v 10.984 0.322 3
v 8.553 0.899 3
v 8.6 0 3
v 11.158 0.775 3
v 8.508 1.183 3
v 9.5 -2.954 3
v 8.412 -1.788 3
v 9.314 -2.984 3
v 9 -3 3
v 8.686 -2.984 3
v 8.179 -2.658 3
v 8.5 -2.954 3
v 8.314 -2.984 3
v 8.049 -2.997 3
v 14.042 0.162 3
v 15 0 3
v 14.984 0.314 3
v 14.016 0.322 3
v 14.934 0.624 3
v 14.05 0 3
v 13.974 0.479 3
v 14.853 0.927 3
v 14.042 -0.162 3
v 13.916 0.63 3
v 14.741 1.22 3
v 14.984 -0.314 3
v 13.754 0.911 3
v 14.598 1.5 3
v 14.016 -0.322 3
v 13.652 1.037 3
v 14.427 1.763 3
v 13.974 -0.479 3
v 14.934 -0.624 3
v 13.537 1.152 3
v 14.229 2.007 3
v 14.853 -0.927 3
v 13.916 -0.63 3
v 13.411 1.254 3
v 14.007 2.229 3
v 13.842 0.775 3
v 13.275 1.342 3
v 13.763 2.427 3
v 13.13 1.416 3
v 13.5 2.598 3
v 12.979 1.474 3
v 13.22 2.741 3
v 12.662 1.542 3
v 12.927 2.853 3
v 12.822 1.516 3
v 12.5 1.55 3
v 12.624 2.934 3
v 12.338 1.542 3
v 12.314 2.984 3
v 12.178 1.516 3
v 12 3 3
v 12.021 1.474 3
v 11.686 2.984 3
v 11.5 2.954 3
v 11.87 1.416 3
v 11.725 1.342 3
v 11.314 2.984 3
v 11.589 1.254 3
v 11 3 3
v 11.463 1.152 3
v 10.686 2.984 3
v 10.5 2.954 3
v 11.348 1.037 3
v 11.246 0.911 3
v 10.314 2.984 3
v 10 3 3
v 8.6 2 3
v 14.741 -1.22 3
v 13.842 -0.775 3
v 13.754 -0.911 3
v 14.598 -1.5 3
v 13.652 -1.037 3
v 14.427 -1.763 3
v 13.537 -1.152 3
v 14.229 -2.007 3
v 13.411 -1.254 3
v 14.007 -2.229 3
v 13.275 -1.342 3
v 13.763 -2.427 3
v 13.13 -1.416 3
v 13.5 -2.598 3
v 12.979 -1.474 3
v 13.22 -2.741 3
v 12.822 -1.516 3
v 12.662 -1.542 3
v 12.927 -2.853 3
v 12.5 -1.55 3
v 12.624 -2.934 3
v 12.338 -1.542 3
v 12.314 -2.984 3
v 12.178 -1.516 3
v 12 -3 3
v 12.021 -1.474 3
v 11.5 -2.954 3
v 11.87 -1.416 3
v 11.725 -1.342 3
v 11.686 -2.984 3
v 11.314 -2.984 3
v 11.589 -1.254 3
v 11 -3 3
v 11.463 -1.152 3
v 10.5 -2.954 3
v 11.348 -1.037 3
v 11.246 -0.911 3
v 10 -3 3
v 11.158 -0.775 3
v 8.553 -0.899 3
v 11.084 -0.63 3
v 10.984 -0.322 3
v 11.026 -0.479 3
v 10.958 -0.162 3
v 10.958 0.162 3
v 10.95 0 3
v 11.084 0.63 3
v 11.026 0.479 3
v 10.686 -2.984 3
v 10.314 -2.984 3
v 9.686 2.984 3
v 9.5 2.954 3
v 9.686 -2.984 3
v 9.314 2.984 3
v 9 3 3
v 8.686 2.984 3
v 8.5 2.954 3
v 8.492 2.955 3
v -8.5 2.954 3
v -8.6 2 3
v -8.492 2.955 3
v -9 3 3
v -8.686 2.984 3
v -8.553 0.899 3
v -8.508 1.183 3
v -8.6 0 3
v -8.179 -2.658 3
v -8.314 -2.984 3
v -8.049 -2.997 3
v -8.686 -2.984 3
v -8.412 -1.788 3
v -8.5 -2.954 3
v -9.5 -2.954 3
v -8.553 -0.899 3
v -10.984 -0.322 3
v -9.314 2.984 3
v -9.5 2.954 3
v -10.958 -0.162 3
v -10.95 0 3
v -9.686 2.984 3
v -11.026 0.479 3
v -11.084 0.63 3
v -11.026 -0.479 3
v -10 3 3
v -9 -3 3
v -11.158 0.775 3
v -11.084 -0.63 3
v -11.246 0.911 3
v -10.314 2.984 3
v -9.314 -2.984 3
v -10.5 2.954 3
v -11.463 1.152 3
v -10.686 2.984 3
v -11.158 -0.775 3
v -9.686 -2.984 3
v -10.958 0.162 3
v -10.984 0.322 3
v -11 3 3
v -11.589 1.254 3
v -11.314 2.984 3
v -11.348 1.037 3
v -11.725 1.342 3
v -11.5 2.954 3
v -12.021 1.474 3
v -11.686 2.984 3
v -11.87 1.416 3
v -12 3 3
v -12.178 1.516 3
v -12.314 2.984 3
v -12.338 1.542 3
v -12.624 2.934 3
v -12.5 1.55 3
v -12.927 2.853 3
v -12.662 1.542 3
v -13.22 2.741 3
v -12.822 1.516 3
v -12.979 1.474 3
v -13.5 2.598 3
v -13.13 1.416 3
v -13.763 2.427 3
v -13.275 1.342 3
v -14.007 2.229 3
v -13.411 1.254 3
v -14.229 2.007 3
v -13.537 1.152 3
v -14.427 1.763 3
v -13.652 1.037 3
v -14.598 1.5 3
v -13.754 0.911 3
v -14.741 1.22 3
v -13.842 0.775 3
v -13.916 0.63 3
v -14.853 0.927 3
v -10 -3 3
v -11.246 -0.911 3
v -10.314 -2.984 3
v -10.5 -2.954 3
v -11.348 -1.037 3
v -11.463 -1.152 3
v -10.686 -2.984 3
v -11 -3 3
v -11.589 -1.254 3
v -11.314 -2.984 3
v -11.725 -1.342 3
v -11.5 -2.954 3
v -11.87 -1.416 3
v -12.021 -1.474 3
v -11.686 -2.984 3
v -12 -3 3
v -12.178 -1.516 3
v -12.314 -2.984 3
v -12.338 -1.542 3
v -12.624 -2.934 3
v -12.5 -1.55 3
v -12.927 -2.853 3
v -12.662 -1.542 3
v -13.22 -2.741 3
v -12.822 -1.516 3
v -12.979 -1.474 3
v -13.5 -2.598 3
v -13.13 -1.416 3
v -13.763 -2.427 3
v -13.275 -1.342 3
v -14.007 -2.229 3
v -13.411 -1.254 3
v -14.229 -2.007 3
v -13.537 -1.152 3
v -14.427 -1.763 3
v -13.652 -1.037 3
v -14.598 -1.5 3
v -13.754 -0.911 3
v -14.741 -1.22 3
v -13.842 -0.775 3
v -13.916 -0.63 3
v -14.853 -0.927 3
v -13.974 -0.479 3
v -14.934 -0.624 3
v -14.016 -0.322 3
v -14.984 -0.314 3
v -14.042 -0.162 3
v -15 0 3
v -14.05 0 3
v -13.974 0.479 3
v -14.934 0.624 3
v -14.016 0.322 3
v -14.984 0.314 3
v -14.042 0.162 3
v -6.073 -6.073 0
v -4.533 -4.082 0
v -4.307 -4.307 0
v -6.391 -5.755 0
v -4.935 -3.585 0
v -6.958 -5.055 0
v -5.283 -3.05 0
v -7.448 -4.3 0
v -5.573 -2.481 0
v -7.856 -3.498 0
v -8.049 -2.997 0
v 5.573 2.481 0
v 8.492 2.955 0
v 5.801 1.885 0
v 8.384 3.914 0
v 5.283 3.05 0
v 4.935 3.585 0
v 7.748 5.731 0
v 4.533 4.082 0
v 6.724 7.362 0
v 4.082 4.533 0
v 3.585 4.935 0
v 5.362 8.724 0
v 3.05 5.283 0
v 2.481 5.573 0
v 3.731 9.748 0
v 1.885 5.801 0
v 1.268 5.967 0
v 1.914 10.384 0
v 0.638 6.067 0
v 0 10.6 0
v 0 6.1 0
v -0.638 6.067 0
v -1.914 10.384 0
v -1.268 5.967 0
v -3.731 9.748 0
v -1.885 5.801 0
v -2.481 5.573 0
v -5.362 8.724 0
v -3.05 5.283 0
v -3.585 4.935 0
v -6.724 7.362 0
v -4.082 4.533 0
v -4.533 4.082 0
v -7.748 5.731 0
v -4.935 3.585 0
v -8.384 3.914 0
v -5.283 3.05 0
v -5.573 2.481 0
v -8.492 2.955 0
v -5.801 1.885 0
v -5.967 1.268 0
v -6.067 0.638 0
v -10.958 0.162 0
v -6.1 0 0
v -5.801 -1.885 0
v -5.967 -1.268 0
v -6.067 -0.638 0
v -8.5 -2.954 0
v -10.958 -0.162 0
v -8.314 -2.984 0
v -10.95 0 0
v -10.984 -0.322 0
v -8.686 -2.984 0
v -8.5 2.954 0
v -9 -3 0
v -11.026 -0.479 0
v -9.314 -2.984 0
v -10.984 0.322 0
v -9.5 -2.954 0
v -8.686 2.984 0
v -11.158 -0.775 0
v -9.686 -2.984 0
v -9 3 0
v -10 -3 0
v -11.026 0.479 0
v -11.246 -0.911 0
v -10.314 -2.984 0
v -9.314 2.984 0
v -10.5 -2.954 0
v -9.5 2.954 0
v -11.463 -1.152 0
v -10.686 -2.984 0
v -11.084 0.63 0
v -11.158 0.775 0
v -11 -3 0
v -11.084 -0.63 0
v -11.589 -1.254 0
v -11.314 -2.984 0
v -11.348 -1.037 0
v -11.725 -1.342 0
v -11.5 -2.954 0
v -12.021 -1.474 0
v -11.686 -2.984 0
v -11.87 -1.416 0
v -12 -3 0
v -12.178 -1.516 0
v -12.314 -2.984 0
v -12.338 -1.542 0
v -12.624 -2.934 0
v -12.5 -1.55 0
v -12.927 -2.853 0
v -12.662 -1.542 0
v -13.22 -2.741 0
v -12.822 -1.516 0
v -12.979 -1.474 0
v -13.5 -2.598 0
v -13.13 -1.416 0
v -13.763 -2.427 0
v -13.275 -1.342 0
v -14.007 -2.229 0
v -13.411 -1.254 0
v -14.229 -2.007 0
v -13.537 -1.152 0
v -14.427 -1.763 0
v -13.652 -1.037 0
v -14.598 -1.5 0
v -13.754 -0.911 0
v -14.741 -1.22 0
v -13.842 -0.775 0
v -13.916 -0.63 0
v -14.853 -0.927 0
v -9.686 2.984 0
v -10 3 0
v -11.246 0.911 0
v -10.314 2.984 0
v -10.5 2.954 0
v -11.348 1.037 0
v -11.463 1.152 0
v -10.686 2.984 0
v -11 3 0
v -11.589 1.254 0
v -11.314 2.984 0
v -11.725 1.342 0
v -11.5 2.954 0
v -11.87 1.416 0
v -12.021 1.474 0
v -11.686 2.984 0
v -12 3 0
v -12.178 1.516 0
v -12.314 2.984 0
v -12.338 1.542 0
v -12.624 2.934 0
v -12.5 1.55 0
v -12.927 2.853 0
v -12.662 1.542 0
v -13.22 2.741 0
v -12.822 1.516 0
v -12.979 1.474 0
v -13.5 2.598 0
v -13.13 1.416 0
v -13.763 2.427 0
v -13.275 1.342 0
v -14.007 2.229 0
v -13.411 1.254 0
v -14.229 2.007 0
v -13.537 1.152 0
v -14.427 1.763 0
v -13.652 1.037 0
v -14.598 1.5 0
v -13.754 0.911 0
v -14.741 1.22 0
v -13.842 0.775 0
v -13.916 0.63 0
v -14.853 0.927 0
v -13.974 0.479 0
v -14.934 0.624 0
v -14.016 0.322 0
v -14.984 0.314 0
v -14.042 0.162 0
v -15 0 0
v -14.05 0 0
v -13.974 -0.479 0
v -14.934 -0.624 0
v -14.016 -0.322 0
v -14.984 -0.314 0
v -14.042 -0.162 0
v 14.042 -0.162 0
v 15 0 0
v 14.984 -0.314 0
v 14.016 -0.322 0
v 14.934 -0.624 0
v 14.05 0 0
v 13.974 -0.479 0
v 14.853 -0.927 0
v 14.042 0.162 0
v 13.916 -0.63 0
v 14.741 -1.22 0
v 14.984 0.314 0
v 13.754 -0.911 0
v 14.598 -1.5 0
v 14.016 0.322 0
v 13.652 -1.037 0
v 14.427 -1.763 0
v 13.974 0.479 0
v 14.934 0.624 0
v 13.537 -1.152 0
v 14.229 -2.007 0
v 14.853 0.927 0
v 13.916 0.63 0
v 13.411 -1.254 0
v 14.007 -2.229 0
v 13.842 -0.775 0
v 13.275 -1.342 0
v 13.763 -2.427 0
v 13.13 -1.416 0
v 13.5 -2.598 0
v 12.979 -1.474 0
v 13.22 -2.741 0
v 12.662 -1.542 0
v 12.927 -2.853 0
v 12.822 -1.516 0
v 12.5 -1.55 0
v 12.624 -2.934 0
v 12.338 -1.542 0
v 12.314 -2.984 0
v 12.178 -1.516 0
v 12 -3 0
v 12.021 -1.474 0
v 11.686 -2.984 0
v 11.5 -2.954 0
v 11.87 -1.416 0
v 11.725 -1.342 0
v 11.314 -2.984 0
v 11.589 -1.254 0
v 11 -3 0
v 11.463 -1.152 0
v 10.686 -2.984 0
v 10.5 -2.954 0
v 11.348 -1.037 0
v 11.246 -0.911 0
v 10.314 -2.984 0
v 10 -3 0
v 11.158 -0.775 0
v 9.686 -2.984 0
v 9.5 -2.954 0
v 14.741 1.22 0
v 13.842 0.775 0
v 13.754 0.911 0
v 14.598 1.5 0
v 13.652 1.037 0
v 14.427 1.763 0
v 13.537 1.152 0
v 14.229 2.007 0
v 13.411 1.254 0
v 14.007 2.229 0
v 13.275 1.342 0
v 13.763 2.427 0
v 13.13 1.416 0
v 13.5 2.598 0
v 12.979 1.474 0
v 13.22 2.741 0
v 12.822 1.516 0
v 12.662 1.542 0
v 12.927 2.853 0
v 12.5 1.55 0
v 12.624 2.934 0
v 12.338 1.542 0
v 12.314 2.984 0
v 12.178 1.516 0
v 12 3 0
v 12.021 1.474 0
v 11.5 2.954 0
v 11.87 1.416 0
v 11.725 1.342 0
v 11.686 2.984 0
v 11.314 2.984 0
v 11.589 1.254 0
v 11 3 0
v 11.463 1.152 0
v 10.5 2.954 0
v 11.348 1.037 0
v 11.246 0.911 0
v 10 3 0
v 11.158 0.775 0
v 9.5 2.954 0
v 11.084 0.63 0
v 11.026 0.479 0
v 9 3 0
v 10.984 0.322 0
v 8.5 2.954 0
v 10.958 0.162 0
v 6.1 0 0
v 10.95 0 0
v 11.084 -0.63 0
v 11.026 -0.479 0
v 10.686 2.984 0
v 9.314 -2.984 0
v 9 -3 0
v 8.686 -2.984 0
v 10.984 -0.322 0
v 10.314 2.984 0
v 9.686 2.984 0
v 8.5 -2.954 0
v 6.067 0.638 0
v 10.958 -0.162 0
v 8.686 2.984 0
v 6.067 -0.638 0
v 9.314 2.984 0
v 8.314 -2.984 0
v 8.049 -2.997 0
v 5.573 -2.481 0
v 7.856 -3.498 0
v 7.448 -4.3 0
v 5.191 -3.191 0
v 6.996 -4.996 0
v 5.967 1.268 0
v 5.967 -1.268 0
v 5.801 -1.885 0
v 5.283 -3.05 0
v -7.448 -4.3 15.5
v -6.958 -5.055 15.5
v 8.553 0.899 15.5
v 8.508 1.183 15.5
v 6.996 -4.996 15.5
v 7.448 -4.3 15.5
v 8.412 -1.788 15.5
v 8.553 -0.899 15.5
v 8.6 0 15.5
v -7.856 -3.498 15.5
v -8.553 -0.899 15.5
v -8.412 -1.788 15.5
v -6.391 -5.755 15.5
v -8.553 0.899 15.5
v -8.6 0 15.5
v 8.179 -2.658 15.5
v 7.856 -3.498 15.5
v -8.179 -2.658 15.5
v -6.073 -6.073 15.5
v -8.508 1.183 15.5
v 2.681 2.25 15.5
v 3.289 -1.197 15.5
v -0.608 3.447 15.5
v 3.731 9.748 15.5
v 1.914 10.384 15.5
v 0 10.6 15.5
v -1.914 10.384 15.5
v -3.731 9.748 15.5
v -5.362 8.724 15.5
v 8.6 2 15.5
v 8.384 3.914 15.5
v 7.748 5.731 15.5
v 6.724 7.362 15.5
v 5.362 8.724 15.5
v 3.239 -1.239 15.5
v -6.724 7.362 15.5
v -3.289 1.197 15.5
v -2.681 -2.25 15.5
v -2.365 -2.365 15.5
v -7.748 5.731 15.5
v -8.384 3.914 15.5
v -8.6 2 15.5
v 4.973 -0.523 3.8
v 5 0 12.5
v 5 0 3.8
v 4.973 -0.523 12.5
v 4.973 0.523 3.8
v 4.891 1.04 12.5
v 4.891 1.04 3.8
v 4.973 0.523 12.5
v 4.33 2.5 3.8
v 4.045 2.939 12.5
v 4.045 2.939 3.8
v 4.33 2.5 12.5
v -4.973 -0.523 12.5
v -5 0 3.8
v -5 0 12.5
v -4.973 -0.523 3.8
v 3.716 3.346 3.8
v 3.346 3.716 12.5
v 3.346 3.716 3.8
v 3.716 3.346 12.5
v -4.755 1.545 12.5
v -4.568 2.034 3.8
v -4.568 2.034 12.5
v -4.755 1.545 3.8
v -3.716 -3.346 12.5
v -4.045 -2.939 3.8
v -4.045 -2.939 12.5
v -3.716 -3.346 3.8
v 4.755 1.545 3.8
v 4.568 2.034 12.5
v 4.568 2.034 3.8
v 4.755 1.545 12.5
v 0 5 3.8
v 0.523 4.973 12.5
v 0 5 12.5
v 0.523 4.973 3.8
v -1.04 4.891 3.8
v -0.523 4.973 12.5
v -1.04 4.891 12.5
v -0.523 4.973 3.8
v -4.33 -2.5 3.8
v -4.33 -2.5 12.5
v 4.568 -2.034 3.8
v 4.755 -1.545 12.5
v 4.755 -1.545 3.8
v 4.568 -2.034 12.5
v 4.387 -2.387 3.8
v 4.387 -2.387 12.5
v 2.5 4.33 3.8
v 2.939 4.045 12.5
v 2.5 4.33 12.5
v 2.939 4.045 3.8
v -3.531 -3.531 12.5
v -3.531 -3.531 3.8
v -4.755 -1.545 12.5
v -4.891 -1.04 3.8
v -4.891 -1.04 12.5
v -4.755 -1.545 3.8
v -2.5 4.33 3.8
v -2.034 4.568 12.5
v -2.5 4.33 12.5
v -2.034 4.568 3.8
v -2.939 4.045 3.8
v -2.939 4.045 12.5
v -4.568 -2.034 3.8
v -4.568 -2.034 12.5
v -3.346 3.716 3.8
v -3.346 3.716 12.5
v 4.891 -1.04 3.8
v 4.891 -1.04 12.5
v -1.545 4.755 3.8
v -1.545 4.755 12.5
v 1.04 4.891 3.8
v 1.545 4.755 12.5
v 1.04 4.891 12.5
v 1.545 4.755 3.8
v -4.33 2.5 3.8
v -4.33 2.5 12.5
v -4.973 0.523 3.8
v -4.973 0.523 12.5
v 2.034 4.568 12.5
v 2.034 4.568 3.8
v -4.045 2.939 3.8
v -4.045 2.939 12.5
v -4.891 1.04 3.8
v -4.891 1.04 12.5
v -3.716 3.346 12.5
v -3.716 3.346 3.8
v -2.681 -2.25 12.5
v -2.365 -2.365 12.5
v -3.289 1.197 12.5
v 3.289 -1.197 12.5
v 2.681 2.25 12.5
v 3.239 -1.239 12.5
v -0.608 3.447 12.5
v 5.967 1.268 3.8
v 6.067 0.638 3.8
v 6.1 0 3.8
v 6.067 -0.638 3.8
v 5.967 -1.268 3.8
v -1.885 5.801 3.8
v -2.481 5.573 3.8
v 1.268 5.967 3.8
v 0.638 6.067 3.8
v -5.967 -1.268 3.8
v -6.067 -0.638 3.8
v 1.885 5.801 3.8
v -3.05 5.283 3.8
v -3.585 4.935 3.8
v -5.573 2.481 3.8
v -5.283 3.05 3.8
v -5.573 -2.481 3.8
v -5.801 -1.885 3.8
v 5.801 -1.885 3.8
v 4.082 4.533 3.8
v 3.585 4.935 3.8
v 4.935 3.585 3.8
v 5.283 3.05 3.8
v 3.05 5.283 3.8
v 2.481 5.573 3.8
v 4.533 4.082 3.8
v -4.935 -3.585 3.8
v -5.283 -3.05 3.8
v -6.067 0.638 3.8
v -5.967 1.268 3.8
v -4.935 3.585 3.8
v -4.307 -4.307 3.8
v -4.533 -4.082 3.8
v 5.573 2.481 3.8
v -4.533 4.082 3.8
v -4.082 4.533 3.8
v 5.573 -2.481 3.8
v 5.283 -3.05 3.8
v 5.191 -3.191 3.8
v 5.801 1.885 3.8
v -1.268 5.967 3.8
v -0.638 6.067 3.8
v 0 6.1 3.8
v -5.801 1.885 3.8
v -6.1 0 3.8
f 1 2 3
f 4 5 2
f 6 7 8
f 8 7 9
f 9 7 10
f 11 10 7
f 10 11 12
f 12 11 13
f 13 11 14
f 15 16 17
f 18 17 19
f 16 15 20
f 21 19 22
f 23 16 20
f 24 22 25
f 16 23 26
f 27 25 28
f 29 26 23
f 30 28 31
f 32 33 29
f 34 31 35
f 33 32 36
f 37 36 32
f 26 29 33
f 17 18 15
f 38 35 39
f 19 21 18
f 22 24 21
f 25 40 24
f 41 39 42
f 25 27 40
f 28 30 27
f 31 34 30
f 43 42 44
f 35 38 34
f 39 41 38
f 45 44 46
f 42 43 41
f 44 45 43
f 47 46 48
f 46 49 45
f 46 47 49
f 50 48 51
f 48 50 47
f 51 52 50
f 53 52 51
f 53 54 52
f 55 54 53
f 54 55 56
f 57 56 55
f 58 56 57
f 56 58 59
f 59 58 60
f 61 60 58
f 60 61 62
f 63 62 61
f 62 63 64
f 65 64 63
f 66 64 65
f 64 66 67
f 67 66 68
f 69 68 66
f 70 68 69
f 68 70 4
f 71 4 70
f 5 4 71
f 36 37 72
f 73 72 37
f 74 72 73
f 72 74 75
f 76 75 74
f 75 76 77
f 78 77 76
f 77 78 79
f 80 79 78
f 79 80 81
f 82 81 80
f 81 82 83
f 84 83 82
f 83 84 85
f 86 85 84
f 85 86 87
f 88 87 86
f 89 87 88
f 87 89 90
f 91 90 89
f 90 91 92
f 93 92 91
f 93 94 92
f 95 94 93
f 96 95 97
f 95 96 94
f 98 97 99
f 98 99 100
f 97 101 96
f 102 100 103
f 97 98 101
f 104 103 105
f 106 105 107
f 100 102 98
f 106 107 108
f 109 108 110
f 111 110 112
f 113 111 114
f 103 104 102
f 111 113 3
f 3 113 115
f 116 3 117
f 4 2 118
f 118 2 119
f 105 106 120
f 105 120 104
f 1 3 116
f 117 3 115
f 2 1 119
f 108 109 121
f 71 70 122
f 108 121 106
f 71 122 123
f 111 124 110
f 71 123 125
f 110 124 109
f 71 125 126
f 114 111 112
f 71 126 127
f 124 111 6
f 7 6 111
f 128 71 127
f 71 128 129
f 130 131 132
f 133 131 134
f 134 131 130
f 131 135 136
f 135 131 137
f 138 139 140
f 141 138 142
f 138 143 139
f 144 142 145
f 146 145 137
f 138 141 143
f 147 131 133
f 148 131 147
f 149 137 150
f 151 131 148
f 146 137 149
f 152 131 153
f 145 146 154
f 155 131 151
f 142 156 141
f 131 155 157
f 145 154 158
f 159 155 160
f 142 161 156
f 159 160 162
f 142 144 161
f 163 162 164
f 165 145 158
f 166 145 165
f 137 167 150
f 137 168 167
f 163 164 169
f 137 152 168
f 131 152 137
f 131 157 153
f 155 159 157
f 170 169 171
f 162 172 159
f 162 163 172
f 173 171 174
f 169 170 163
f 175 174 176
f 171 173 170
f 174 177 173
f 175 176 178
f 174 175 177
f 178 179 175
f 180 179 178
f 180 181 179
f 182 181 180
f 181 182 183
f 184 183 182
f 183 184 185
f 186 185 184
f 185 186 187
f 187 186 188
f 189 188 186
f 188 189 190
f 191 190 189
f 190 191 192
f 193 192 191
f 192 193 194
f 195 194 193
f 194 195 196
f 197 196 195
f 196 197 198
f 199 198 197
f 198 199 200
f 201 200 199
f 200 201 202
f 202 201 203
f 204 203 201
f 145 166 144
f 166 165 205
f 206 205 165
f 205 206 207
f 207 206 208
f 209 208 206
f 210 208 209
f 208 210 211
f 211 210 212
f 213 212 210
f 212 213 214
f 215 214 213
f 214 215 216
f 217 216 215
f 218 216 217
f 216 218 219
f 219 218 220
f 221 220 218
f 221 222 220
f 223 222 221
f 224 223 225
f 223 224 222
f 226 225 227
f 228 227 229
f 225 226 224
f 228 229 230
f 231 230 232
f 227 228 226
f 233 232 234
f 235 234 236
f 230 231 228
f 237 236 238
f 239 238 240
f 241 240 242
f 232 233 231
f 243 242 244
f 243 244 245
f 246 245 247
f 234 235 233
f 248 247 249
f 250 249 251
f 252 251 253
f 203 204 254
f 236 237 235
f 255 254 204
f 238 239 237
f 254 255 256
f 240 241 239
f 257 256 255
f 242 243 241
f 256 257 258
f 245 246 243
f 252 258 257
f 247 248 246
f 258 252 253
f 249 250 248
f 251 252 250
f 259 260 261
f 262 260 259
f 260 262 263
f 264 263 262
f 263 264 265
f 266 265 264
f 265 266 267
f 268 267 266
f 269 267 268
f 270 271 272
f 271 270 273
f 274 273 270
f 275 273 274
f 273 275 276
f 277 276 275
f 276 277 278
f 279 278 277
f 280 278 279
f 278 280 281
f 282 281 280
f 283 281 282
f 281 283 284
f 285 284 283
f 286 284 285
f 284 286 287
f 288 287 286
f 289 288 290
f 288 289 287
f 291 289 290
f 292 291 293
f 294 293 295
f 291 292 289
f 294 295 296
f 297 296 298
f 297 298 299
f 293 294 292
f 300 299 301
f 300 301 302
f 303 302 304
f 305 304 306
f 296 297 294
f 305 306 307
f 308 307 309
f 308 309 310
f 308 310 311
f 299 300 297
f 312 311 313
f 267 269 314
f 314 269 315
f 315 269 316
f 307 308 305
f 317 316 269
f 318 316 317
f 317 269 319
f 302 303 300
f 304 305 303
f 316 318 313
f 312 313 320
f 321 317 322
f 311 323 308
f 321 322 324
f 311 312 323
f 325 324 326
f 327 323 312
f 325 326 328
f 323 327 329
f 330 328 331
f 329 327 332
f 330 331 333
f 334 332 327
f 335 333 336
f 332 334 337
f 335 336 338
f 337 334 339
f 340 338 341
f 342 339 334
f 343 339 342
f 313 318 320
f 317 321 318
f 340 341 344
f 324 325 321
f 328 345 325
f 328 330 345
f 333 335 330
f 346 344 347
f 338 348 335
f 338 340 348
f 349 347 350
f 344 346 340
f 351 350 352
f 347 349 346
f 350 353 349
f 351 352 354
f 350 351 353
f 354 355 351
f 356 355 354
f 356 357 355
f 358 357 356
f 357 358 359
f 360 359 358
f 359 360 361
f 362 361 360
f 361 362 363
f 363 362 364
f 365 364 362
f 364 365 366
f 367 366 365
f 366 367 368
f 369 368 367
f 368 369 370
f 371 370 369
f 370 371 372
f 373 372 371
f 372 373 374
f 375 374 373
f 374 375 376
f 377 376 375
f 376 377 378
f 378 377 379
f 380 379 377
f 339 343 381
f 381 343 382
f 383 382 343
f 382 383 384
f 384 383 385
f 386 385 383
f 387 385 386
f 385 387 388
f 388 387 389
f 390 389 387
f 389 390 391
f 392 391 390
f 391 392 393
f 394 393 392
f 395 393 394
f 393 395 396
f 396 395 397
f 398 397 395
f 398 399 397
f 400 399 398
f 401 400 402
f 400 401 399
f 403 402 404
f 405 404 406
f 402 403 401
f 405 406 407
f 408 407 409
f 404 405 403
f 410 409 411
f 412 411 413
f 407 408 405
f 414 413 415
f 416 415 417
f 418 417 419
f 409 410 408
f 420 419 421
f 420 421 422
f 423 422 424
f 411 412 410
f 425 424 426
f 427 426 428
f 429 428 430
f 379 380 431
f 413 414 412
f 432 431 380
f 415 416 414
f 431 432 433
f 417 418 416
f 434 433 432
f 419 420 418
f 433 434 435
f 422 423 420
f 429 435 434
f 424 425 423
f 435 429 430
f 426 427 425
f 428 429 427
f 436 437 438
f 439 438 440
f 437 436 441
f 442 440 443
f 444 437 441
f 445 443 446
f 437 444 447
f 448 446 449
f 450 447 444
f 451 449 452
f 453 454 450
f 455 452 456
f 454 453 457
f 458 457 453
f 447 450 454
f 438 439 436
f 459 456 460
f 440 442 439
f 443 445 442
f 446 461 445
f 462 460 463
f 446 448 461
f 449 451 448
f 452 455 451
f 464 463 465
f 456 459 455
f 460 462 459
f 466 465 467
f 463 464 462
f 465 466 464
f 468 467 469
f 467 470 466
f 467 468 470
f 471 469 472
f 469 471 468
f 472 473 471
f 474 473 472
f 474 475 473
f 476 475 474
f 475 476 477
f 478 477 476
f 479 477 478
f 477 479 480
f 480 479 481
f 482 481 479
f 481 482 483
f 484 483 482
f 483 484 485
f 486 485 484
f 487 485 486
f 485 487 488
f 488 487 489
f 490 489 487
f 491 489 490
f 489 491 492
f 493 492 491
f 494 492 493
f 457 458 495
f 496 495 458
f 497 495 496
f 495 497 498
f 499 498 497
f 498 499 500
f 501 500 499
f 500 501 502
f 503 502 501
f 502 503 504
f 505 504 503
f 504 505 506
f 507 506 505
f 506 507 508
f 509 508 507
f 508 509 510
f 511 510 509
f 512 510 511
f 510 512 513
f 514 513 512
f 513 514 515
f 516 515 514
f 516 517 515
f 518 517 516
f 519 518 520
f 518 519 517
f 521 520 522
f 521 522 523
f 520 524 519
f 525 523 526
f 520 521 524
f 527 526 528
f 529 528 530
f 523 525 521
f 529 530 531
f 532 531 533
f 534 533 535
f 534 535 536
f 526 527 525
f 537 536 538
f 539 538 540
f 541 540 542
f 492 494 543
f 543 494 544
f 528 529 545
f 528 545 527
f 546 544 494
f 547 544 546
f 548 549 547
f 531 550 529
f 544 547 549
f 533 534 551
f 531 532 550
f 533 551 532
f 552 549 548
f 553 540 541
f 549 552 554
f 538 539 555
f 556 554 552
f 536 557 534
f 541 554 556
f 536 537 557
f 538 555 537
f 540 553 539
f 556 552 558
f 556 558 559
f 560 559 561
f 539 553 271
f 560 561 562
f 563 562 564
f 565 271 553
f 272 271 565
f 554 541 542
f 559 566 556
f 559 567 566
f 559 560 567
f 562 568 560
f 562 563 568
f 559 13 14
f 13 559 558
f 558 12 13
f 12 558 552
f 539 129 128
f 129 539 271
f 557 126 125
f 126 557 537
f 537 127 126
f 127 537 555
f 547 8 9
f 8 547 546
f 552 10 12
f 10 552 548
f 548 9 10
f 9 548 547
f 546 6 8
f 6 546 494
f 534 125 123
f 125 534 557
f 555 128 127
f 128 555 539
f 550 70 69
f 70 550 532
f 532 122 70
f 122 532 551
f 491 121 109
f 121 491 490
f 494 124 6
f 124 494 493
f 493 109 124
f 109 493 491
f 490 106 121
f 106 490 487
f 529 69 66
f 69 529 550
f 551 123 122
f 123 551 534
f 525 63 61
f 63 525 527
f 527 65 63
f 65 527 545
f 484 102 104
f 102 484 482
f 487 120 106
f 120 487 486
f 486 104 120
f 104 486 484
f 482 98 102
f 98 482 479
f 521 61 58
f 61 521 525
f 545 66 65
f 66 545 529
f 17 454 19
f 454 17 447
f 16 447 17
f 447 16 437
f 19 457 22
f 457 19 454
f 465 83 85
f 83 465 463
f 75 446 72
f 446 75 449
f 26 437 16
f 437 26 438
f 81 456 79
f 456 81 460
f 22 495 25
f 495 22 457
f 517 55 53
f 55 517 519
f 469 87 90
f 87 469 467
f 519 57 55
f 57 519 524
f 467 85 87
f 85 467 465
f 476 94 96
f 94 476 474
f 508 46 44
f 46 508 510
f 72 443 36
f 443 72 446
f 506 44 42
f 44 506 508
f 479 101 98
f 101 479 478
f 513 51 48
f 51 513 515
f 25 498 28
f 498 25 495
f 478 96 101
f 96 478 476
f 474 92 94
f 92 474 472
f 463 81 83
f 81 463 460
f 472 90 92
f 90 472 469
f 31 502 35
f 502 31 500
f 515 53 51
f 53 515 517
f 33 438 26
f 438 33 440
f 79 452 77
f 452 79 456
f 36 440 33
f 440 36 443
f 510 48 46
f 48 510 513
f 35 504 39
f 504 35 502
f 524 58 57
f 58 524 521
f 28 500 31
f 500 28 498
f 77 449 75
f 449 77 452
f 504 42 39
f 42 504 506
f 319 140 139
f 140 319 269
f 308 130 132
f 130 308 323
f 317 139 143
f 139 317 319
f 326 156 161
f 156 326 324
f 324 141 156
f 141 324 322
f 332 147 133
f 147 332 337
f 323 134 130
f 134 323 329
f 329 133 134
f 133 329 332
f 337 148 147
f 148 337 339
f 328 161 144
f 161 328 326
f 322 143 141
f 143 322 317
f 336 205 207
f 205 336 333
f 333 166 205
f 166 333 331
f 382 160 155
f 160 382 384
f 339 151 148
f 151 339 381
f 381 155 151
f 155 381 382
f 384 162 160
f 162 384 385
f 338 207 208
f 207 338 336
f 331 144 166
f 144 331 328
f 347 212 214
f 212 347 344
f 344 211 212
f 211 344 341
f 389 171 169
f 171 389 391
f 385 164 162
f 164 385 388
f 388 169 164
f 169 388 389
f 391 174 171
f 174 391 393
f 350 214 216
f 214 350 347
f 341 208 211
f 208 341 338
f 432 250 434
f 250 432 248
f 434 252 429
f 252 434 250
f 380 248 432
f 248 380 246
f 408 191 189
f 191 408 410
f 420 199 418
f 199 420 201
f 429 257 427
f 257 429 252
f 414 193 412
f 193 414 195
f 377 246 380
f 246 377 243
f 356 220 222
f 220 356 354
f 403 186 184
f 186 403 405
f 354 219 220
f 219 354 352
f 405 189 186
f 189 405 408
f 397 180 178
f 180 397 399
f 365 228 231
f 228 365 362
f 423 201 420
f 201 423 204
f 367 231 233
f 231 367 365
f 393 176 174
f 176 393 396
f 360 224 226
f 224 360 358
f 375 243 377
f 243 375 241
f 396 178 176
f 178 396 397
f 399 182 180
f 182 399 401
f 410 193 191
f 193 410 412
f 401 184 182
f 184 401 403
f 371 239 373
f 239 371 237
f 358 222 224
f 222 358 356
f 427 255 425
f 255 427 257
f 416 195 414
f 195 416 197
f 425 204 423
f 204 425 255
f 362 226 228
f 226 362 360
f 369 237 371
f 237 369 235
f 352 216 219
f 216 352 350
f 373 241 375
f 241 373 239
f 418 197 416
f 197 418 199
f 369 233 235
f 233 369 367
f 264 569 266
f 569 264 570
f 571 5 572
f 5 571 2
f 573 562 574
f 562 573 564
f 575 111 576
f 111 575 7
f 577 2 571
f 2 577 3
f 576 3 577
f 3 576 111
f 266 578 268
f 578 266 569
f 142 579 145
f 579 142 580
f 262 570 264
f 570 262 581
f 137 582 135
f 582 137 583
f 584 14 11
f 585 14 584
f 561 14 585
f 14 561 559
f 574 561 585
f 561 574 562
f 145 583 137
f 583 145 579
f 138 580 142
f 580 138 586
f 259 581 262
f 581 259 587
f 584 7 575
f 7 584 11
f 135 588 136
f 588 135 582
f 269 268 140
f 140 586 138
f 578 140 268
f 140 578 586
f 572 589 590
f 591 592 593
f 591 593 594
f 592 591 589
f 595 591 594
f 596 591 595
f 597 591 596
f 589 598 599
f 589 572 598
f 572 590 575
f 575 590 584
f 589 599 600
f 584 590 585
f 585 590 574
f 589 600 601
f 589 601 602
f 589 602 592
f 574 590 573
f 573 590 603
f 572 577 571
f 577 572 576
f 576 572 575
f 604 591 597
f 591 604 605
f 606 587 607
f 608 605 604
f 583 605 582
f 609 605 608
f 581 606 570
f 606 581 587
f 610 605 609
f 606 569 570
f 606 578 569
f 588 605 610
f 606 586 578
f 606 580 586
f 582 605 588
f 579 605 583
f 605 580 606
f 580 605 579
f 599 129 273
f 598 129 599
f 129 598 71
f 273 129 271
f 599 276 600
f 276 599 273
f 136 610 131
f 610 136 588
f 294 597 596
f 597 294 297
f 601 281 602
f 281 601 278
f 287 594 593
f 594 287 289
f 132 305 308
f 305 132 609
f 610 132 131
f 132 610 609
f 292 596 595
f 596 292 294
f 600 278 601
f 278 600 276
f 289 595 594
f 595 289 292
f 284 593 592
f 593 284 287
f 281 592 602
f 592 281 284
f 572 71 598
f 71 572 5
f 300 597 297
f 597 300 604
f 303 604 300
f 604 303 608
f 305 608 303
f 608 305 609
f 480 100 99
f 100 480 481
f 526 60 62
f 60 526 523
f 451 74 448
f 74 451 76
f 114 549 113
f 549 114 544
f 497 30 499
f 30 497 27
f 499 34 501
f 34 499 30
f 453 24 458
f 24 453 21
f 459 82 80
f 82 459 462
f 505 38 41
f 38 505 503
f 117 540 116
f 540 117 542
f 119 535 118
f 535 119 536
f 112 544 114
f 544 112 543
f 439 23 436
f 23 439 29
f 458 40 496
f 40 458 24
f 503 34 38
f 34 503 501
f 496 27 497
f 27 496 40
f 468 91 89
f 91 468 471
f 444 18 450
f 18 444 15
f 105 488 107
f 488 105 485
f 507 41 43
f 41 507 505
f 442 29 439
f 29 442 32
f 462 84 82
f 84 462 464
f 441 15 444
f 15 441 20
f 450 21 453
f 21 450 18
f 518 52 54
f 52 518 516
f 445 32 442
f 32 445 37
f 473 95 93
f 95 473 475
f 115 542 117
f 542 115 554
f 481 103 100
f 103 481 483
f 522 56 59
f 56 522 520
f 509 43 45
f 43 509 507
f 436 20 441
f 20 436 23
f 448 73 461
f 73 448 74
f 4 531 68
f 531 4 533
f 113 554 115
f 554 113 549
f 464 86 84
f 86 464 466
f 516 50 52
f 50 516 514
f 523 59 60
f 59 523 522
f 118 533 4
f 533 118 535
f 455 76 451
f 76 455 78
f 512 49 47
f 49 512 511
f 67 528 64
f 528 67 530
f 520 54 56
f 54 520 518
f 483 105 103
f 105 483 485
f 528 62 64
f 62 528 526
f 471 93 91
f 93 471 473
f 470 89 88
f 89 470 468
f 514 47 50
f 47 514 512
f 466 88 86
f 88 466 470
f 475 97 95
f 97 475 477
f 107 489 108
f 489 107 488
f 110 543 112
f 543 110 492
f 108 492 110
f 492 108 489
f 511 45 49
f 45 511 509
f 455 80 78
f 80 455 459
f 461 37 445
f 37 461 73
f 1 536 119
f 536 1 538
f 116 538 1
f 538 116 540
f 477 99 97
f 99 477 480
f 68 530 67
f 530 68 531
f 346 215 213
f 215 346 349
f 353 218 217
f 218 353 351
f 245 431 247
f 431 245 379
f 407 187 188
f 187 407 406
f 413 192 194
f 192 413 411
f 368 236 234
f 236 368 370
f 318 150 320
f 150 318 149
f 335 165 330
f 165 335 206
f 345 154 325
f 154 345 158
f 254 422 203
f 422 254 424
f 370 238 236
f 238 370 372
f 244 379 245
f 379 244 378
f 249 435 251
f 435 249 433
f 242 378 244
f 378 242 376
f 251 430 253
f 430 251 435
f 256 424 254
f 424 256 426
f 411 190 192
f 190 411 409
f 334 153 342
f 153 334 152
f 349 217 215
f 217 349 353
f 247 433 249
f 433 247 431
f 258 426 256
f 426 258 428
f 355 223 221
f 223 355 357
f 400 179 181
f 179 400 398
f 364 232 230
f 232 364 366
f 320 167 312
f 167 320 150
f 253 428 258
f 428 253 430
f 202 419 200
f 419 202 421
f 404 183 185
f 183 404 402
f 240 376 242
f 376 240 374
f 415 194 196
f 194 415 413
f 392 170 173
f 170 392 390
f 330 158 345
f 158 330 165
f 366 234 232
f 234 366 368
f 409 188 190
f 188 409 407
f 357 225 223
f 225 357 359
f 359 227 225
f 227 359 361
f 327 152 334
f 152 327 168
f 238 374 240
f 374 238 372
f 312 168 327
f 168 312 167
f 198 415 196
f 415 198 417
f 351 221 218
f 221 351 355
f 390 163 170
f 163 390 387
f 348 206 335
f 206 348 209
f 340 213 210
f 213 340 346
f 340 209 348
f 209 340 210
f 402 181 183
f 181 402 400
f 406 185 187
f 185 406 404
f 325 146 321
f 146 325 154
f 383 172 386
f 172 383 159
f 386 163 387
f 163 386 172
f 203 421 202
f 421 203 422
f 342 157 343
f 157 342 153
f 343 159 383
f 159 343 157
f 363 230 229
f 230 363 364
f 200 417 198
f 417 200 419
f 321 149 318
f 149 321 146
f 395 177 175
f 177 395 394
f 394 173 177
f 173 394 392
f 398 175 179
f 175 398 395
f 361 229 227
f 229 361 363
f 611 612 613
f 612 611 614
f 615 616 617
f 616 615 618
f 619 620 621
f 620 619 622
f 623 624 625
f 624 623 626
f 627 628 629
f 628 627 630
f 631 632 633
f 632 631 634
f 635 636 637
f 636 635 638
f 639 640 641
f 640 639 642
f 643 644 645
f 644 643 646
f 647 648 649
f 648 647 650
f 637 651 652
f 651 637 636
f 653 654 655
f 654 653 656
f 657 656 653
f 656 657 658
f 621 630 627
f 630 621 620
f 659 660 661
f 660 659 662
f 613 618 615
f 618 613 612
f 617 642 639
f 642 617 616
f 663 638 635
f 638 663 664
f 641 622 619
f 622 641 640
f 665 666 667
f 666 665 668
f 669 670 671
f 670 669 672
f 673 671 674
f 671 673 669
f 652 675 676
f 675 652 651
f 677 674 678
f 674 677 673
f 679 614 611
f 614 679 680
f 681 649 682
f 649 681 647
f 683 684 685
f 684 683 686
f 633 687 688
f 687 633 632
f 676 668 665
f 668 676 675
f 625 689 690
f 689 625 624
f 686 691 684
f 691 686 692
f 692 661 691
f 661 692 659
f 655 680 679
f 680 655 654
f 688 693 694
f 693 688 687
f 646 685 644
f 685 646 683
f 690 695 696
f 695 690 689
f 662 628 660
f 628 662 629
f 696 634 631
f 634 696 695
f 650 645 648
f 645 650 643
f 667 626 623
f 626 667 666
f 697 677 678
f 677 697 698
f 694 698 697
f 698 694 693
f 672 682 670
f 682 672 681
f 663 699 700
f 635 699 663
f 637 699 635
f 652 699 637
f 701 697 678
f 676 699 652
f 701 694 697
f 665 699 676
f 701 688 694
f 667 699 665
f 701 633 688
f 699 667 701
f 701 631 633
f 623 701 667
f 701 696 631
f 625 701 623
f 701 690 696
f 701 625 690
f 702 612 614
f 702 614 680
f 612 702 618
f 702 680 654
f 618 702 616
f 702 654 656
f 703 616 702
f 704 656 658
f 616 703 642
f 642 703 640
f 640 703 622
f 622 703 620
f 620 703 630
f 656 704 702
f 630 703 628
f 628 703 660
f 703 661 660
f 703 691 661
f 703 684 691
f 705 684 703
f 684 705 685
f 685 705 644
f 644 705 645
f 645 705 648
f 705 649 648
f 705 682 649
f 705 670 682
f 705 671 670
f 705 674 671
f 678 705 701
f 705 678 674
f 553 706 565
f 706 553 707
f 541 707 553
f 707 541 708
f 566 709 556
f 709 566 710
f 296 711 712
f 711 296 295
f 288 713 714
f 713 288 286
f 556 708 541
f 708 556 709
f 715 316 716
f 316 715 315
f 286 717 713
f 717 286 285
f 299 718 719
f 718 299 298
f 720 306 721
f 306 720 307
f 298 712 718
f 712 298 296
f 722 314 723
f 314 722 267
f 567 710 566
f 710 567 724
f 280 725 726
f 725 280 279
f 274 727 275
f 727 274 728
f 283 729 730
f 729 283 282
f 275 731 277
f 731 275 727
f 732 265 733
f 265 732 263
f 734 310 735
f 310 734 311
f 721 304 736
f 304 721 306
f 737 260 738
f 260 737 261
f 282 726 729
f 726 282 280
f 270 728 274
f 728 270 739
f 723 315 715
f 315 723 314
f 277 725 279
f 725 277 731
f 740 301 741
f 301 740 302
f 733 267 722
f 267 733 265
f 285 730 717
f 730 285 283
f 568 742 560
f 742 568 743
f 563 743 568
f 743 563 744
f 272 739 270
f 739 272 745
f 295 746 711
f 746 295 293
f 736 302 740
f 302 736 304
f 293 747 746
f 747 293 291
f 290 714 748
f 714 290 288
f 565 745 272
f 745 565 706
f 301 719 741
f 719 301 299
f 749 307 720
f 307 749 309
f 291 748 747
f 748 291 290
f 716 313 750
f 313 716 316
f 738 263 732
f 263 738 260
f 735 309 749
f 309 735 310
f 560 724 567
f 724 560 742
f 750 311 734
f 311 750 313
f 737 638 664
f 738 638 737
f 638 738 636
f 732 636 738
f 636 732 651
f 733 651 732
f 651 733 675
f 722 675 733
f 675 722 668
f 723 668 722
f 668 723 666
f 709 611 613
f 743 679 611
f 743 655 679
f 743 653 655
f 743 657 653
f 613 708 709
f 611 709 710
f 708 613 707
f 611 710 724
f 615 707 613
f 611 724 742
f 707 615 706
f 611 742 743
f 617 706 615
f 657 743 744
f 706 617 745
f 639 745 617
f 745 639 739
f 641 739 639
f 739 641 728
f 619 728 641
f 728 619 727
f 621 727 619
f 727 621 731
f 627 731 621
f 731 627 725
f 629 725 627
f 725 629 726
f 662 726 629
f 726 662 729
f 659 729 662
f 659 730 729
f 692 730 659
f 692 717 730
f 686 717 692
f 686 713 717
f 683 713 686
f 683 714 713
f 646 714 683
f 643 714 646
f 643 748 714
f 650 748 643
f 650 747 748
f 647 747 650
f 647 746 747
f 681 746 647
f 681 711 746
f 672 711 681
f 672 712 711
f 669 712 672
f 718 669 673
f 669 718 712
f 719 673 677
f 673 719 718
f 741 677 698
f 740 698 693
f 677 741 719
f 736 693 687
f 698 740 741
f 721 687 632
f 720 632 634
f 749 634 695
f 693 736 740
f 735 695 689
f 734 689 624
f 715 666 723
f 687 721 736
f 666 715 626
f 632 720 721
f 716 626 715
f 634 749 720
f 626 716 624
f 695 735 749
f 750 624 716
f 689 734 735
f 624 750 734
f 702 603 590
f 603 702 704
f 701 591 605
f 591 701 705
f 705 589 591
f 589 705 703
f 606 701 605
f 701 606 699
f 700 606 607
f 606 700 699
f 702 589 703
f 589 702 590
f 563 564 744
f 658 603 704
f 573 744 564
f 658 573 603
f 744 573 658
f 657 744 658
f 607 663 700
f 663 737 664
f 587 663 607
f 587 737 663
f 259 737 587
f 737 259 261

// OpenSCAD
bottomdia=11.2;
bottomheight=10.8;
height=20.5;
effectorheight=8;
topdia=9.0;
wall=3;
pipedia=7;
mount_radius=12.5; // standard hole mounting = 25mm therefore 12.5

module nozzleholder() {
    difference(){
            union(){
    //base for effector nuts
            for (a=[-45,145]) rotate ([0,0,a])
                for (b=[0:mount_radius]) translate([b,0,0]) cylinder(r=wall+1,h=wall, $fn=60);
    //main body
            cylinder(r=(bottomdia/2)+wall, h=height+wall, $fn=60);
    //reinforcement
            translate ([2,1, 0]) cylinder(r=(bottomdia/2)+wall, h=height+wall, $fn=60);
                    }
    //hollow for holder
            translate ([0,0,-1])
                cylinder(r=(bottomdia/2+0.5), h=bottomheight+1, $fn=60);#
            translate ([0,0,bottomheight])
                cylinder(r=(topdia/2)+0.5, h=height-bottomheight, $fn=60);#
            //hole for mount screws
                    for (a=[-45,145]) rotate ([0,0,a])
                    translate([mount_radius,0,0]) cylinder(r=1.55, h=3*wall, $fn=60);
    //hole for pipe and holder
            rotate([0,0,40])cylinder(r=(pipedia/2),h=height+5, $fn=6);
    //cutaway - bottom
    //        translate([-40,-20,wall]) rotate([0,0,37])cube([30,35,bottomheight-wall]);
    //        translate([7,-22,wall]) rotate([0,0,37])cube([30,20,bottomheight-wall]);
    //cutaway - mid
    //        translate([-10,-5,bottomheight+wall]) rotate([0,0,37])cube([30,30,height-bottomheight-wall]);
    //        translate([7,-22,bottomheight+wall]) rotate([0,0,37])cube([30,20,height-bottomheight-wall]);
    //cutaway cheeseslice
            translate([1,1,-5]) linear_extrude(height = height+15) polygon(points=[[0,0],[-bottomdia*2,0],[0,-bottomdia*2]]);
            }
            }
            
//this module for use when some of the needleholder physically penetrates the effector. Adds variable effectorheight for region contained within effector, surprisingly enough     
module cutoffnozzleholder() {
    difference(){
            union(){
    //base for effector nuts
            for (a=[0,180]) rotate ([0,0,a])
                for (b=[0:mount_radius]) translate([b,0,0]) cylinder(r=wall,h=wall, $fn=60);
    //main body
            cylinder(r=(bottomdia/2)+wall, h=height+wall-effectorheight, $fn=60);
    //reinforcement
            translate ([0,2, 0]) cylinder(r=(bottomdia/2)+wall, h=height+wall-effectorheight);
                    }
            //hollow for holder
            translate ([0,0,(bottomheight-effectorheight)])
                cylinder(r=(topdia/2)+0.5, h=height-bottomheight, $fn=60);#
            translate ([0,0,-effectorheight])
                cylinder(r=(bottomdia/2+0.5), h=bottomheight+1, $fn=60);
            //hole for mount screws
                    for (a=[0,180]) rotate ([0,0,a])
                    translate([mount_radius,0,0]) cylinder(r=1.55, h=3*wall, $fn=60);
            //hole for pipe and holder
            rotate([0,0,40])cylinder(r=(pipedia/2),h=height+5, $fn=6);
            translate([1,1,-5]) linear_extrude(height = height+15) polygon(points=[[0,0],[-bottomdia*2,-bottomdia*2],[bottomdia*2,-bottomdia*2]]);
            }
            }
cutoffnozzleholder();
